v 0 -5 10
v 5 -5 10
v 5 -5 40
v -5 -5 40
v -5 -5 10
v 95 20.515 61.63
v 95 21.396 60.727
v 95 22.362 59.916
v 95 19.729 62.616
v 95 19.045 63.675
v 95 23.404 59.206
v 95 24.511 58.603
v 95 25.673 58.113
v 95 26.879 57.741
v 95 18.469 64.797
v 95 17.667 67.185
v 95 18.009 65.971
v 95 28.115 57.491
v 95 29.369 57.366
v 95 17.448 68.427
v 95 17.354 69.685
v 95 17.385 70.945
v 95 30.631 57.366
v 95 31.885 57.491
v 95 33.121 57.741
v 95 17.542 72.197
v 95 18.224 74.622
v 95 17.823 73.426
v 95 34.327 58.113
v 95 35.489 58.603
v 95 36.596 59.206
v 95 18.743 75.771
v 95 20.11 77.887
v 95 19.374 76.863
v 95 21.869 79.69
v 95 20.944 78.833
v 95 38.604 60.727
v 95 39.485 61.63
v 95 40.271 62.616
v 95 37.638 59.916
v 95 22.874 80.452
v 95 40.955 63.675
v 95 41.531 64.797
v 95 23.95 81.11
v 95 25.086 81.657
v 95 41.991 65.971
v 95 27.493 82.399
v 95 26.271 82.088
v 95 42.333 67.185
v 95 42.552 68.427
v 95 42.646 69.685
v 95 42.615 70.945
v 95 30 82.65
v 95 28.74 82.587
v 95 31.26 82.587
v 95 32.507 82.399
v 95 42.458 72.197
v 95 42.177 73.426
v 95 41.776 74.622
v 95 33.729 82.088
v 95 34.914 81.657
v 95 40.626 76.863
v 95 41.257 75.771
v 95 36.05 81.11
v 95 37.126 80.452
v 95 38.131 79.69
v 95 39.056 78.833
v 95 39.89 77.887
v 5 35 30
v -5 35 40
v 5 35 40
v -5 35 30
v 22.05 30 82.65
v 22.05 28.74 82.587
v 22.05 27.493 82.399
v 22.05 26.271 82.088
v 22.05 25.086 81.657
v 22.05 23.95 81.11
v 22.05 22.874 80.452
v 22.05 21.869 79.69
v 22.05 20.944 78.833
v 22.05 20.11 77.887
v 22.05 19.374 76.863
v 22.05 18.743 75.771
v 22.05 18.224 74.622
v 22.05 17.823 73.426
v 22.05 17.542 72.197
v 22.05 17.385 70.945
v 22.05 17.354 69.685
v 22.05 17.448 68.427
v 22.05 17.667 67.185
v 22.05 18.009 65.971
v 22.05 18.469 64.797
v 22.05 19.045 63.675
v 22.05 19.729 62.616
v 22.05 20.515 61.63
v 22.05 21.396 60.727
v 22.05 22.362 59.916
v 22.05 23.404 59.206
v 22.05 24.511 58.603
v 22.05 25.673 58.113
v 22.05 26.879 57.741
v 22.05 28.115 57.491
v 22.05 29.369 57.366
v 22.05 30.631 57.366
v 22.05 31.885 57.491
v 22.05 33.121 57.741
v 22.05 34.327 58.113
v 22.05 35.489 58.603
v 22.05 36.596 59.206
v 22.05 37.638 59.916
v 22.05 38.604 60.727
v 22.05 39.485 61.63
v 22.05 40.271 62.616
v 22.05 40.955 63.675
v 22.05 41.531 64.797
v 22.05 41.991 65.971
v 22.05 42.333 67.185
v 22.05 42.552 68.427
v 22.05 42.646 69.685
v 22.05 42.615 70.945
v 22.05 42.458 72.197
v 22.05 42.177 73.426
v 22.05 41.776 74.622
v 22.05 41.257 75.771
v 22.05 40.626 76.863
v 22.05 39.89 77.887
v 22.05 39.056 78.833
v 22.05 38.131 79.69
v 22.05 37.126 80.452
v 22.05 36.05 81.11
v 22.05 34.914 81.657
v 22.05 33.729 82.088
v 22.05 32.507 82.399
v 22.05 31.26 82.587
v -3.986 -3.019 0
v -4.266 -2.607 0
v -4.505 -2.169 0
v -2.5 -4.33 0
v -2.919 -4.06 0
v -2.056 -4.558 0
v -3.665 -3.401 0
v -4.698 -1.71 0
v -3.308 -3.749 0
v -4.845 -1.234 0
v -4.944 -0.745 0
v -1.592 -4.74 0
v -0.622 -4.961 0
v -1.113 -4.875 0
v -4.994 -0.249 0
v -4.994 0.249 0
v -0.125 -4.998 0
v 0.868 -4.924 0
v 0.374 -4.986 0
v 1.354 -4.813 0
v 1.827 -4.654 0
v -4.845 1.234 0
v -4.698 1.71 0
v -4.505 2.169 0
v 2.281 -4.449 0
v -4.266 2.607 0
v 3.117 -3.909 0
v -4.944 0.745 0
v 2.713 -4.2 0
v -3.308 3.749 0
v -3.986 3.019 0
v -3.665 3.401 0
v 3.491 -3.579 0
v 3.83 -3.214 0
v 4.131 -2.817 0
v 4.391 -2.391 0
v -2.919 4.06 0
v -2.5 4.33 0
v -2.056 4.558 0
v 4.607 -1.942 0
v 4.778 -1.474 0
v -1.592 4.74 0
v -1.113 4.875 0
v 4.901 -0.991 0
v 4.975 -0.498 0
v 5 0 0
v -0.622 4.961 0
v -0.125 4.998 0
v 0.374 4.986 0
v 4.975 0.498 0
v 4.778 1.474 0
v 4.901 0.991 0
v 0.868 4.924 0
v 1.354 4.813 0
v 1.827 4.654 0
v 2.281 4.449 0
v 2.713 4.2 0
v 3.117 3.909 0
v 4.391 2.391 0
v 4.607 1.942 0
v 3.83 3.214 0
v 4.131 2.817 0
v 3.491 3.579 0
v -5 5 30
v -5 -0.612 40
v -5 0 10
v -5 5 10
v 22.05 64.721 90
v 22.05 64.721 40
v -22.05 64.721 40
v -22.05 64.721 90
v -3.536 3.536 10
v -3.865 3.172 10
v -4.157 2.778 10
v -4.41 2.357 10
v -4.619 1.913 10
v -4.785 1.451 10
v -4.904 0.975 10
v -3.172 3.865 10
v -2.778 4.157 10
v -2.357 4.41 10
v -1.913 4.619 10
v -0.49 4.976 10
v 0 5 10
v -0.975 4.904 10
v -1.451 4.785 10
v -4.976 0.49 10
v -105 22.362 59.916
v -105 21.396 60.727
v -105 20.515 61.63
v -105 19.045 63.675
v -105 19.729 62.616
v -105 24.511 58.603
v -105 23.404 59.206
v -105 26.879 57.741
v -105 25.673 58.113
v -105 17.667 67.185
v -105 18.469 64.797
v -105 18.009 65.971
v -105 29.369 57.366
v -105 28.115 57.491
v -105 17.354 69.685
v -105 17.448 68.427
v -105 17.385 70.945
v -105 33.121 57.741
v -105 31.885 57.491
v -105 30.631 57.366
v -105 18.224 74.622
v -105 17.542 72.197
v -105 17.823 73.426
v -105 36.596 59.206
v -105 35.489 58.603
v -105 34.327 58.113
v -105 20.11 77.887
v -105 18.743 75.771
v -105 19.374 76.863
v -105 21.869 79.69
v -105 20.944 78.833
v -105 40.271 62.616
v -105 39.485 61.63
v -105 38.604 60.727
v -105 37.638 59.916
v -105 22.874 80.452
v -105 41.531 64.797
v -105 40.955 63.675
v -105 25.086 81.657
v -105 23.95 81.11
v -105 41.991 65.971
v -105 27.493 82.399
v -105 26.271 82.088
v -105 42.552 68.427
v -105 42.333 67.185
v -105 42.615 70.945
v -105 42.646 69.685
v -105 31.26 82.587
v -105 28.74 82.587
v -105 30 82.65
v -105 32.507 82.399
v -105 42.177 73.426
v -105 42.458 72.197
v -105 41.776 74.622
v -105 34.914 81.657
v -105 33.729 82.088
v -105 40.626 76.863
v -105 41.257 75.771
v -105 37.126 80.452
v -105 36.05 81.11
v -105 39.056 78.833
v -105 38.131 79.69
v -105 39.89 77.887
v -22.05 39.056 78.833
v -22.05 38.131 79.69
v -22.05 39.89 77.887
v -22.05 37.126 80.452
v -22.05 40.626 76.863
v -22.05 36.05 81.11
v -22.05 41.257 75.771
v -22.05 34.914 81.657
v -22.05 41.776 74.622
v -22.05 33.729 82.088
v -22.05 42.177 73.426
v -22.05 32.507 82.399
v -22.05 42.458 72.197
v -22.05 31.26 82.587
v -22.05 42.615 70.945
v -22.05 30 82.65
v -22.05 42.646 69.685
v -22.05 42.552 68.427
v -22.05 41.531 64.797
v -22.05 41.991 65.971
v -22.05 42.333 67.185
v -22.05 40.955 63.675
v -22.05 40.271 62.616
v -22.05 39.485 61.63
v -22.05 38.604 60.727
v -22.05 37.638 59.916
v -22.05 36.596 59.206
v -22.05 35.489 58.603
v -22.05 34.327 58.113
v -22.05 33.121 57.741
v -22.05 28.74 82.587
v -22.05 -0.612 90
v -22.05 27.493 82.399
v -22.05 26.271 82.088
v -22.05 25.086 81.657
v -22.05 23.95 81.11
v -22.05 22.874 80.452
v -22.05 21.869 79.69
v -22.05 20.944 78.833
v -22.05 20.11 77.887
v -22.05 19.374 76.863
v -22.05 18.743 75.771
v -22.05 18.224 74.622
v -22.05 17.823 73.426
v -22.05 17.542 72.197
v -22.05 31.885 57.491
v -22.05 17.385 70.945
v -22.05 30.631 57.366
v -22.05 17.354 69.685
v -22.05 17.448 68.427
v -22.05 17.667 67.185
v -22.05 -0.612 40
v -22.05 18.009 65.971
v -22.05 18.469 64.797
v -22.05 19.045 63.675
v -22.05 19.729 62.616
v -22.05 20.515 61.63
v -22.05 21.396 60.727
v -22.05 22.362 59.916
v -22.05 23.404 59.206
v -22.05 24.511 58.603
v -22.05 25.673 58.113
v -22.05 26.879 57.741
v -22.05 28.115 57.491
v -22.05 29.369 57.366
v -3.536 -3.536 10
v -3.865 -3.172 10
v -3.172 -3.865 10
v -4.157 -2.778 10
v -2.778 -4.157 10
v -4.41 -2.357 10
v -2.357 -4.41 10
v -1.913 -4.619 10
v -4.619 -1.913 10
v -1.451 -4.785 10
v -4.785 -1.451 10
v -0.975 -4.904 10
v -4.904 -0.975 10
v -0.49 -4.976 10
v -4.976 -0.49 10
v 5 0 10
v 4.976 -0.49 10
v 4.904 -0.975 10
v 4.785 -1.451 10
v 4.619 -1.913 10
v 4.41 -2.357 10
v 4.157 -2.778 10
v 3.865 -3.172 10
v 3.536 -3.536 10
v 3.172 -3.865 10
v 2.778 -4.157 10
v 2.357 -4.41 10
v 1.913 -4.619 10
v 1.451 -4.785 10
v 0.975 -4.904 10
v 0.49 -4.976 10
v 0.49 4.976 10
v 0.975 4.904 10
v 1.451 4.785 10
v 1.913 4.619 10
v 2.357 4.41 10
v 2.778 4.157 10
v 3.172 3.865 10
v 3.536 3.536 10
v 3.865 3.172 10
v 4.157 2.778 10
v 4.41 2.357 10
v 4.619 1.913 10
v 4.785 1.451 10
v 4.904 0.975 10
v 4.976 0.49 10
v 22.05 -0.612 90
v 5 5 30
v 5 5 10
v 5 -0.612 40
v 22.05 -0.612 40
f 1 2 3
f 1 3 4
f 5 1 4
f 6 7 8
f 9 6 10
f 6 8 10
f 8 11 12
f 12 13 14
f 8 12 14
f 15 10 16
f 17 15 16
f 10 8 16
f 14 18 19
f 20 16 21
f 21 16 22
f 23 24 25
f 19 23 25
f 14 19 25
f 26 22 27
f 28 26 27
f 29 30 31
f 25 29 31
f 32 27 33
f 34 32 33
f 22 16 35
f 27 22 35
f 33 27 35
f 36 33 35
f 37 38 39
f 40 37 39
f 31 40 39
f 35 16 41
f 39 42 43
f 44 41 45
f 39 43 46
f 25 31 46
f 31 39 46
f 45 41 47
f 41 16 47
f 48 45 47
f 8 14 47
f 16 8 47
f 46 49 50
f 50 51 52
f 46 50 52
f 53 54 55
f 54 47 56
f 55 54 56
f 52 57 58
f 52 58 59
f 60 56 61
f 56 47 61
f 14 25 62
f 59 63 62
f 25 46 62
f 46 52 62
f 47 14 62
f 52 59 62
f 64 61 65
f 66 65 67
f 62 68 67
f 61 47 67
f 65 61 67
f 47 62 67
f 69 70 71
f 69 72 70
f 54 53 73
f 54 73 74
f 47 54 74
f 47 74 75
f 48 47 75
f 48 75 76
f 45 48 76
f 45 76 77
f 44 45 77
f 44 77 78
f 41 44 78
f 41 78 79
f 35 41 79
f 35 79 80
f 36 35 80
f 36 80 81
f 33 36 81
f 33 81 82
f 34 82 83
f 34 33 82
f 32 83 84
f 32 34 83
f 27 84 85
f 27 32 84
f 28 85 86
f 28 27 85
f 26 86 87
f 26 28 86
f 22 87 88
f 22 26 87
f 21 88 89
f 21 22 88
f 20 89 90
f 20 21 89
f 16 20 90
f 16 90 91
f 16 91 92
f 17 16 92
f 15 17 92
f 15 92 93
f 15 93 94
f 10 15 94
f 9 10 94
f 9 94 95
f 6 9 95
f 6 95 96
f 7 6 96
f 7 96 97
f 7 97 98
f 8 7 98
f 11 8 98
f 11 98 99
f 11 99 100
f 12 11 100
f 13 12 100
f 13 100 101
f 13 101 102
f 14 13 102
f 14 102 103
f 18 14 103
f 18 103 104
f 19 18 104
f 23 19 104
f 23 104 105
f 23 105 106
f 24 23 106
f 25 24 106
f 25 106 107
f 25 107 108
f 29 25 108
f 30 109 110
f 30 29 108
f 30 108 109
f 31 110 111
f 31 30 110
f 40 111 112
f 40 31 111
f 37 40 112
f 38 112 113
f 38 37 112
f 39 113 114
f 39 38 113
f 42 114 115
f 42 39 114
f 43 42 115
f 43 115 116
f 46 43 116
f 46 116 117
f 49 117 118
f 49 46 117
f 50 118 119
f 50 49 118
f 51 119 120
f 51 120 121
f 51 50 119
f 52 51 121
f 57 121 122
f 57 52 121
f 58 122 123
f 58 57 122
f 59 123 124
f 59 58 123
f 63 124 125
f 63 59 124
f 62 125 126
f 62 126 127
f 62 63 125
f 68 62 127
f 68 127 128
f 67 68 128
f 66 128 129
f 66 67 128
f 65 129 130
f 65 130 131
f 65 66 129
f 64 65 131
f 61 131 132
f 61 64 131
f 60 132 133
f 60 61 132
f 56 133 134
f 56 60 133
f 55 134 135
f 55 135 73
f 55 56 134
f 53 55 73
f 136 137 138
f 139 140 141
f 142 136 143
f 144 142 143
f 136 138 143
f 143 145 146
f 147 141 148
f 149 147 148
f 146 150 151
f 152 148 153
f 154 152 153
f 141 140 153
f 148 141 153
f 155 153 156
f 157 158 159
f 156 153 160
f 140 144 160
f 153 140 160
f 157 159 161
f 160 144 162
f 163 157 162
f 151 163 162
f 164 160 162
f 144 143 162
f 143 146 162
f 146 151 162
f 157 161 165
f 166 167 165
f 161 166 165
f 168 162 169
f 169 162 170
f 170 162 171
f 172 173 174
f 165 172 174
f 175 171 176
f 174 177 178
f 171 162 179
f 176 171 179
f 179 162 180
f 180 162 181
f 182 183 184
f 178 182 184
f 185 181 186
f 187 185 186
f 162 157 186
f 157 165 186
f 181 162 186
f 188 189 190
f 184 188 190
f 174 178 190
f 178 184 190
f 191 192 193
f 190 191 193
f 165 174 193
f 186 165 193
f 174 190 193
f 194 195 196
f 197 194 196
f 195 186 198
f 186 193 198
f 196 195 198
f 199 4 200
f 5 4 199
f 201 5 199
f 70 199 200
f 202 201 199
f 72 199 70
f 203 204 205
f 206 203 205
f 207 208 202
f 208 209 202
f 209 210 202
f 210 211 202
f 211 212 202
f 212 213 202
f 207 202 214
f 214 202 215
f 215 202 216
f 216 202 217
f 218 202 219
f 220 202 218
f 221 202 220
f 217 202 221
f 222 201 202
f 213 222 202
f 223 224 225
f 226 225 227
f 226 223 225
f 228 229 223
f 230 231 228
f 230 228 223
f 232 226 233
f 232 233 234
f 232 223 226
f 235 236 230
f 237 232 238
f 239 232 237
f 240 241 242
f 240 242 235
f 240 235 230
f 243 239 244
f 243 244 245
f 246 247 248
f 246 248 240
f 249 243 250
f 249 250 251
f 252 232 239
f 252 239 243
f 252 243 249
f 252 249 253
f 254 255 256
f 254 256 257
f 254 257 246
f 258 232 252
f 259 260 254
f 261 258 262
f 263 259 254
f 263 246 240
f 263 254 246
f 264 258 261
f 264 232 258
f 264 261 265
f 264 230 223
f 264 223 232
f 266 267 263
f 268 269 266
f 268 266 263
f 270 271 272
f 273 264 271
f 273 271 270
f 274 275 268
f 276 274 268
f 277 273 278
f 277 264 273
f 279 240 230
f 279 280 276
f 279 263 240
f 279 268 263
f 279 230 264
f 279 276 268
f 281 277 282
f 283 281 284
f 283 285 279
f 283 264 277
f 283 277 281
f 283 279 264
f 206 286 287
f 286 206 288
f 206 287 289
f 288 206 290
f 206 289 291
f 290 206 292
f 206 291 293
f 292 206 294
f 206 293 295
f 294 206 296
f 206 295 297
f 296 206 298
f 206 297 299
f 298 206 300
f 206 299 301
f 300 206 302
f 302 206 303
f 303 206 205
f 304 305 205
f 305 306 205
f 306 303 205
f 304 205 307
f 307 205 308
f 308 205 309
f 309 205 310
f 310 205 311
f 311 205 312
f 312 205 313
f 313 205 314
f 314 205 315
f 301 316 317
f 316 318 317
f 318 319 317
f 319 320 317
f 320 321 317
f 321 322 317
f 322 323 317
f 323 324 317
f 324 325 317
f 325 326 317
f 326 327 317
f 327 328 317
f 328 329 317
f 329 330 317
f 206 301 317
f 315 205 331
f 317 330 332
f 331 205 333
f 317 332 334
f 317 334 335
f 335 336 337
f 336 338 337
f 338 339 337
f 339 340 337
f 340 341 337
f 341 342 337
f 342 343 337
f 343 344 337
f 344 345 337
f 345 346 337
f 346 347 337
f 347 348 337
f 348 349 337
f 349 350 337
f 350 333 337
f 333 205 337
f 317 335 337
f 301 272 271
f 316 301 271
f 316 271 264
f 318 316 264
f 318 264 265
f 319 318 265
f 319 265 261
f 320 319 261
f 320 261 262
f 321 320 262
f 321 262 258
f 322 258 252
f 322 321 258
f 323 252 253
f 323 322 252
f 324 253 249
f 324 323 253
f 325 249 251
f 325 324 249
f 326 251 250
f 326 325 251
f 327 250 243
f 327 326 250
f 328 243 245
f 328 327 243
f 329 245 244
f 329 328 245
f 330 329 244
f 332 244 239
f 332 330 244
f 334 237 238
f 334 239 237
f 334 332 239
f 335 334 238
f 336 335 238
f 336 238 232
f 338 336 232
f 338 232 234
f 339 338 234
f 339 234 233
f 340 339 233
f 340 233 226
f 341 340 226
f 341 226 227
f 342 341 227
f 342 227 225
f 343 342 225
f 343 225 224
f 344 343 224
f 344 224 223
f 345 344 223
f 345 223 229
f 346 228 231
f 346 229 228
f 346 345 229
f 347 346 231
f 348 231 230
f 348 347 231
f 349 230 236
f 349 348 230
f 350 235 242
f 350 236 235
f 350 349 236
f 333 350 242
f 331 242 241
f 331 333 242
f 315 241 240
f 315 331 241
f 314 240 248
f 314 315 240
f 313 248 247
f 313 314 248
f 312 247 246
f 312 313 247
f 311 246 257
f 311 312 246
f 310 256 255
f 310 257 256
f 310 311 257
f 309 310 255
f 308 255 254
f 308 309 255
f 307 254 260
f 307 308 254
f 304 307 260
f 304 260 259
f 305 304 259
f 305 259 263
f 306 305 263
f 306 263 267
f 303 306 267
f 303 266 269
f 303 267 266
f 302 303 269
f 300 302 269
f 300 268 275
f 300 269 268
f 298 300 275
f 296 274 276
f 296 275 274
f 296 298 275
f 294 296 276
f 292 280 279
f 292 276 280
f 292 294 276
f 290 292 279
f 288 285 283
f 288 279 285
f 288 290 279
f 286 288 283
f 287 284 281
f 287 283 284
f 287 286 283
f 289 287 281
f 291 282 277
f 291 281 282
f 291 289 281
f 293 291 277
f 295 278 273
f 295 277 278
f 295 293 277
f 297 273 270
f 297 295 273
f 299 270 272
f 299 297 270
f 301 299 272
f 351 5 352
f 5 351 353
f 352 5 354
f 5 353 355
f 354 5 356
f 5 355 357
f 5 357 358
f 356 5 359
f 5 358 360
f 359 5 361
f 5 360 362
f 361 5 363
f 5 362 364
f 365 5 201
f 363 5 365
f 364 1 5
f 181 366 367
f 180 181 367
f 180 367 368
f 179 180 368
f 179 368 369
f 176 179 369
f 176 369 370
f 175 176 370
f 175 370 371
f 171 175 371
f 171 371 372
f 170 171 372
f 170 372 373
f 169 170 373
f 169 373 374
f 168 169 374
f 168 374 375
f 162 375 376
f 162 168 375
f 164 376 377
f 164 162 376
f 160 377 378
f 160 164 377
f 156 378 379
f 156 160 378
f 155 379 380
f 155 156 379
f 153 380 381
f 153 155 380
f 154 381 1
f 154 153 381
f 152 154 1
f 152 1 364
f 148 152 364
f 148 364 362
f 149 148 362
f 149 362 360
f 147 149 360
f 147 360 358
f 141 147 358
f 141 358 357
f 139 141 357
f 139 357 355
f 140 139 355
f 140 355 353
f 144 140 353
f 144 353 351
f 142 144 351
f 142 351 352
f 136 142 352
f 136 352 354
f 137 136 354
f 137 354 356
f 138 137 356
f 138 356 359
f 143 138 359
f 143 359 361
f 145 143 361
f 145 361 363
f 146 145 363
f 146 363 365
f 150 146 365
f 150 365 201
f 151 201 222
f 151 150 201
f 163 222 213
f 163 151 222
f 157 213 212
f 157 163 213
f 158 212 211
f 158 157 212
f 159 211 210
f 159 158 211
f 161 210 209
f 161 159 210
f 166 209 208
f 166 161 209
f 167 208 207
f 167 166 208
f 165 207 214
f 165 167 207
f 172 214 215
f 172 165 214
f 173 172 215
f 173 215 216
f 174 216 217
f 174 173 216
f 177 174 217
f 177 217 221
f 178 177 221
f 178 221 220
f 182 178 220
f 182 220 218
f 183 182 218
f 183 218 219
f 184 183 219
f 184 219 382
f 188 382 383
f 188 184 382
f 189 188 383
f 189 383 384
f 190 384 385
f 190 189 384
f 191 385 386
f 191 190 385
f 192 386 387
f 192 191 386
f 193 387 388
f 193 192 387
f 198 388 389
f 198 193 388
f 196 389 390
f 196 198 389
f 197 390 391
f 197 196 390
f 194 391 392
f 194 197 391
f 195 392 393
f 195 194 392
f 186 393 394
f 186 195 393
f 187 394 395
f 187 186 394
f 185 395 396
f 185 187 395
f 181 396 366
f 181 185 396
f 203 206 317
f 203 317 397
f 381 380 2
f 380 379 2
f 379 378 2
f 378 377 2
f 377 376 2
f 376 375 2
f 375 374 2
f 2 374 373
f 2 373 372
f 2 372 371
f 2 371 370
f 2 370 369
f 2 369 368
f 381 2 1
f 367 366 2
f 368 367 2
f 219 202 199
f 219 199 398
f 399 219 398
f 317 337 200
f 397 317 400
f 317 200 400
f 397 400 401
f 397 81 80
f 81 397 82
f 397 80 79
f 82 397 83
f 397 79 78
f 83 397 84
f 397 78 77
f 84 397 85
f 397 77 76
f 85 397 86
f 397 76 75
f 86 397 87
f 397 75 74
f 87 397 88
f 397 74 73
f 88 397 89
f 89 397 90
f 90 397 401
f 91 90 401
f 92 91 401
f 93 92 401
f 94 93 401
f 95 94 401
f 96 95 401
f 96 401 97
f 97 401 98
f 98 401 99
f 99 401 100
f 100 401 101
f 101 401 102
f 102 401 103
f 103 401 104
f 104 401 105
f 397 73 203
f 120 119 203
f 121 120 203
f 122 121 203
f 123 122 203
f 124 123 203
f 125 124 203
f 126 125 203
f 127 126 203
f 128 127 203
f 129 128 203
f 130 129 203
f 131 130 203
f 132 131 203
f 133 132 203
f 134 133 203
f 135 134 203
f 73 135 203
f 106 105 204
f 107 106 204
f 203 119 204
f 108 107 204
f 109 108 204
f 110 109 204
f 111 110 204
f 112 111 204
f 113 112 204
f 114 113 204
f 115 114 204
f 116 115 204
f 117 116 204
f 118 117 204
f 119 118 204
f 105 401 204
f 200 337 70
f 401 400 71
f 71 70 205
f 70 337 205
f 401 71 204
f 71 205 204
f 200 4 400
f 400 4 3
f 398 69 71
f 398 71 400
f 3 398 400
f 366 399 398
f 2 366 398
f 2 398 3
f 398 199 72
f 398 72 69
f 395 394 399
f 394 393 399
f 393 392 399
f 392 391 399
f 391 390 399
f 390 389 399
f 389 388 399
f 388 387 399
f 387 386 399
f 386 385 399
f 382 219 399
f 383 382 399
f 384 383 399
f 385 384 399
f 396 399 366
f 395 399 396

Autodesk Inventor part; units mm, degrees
ref_plane "YZ Plane" through (0, 0, 0) normal (1, 0, 0) x (0, 1, 0)
ref_plane "XZ Plane" through (0, 0, 0) normal (0, 1, 0) x (-1, 0, 0)
ref_plane "XY Plane" through (0, 0, 0) normal (0, 0, 1) x (1, 0, 0)
sketch "Skizze1" plane through (0, 0, 0) normal (0, 0, 1) x (1, 0, 0)
  circle A0 centre (0, 0) radius 5
  dimension "d0" = 10
extrude "Extrusion1" add sketch "Skizze1" along normal blind 10
sketch "Skizze2" plane through (0, 0, 10) normal (0, 0, 1) x (1, 0, 0)
  line L0 (-5, 5) -> (5, 5)
  line L1 (5, 5) -> (5, -5)
  line L2 (5, -5) -> (-5, -5)
  line L3 (-5, -5) -> (-5, 5)
  circle A0 centre (0, 0) radius 5 projected
  dimension "d3" = 10
  dimension "d4" = 10
extrude "Extrusion2" add sketch "Skizze2" along normal blind 30
sketch "Skizze3" plane through (0, 5, 10) normal (0, 1, 0) x (1, 0, 0)
  line L0 (-5, -30) -> (5, -30) projected
  line L1 (5, -30) -> (-5, -30)
  line L2 (-5, -30) -> (-5, -20)
  line L3 (-5, -20) -> (5, -20)
  line L4 (5, -20) -> (5, -30)
  point P0 (0, 10)
  dimension "d7" = 10
  dimension "d8" = 10
extrude "Extrusion3" add sketch "Skizze3" along normal blind 30
sketch "Skizze5" plane through (0, 0, 40) normal (0, 0, 1) x (1, 0, 0)
  line L0 (-5, -5) -> (-5, 35) projected
  line L1 (-5, 35) -> (5, 35)
  line L2 (5, 35) -> (5, 25)
  line L3 (5, 25) -> (-5, 25)
  line L4 (-5, 25) -> (-5, 35)
  point P0 (0, 0)
  dimension "d11" = 10
  dimension "d12" = 10
extrude "Extrusion4" add sketch "Skizze5" along normal blind 30
sketch "Skizze6" plane through (-5, 0, 10) normal (-1, 0, 0) x (0, 0, 1)
  line L0 (60, 25) -> (60, 35) projected
  circle A0 centre (60, 30) radius 12.65
  point P0 (-10, 0)
  dimension "d15" = 25.3
extrude "Extrusion5" add sketch "Skizze6" along normal mid plane 200
sketch "Skizze7" plane through (0, 0, 40) normal (0, 0, 1) x (1, 0, 0)
  line L0 (-22.05, -0.6125) -> (22.05, -0.6125)
  line L1 (22.05, -0.6125) -> (22.05, 64.7208)
  line L2 (22.05, 64.7208) -> (-22.05, 64.7208)
  line L3 (-22.05, 64.7208) -> (-22.05, -0.6125)
  line L4 (-5, 5) -> (-5, 35) projected
  point P0 (0, 0)
  dimension "d18" = 44.1
  dimension "d19" = 17.05
extrude "Extrusion6" add sketch "Skizze7" along normal blind 50
properties part number "ONLY_Inventor_inv1"
